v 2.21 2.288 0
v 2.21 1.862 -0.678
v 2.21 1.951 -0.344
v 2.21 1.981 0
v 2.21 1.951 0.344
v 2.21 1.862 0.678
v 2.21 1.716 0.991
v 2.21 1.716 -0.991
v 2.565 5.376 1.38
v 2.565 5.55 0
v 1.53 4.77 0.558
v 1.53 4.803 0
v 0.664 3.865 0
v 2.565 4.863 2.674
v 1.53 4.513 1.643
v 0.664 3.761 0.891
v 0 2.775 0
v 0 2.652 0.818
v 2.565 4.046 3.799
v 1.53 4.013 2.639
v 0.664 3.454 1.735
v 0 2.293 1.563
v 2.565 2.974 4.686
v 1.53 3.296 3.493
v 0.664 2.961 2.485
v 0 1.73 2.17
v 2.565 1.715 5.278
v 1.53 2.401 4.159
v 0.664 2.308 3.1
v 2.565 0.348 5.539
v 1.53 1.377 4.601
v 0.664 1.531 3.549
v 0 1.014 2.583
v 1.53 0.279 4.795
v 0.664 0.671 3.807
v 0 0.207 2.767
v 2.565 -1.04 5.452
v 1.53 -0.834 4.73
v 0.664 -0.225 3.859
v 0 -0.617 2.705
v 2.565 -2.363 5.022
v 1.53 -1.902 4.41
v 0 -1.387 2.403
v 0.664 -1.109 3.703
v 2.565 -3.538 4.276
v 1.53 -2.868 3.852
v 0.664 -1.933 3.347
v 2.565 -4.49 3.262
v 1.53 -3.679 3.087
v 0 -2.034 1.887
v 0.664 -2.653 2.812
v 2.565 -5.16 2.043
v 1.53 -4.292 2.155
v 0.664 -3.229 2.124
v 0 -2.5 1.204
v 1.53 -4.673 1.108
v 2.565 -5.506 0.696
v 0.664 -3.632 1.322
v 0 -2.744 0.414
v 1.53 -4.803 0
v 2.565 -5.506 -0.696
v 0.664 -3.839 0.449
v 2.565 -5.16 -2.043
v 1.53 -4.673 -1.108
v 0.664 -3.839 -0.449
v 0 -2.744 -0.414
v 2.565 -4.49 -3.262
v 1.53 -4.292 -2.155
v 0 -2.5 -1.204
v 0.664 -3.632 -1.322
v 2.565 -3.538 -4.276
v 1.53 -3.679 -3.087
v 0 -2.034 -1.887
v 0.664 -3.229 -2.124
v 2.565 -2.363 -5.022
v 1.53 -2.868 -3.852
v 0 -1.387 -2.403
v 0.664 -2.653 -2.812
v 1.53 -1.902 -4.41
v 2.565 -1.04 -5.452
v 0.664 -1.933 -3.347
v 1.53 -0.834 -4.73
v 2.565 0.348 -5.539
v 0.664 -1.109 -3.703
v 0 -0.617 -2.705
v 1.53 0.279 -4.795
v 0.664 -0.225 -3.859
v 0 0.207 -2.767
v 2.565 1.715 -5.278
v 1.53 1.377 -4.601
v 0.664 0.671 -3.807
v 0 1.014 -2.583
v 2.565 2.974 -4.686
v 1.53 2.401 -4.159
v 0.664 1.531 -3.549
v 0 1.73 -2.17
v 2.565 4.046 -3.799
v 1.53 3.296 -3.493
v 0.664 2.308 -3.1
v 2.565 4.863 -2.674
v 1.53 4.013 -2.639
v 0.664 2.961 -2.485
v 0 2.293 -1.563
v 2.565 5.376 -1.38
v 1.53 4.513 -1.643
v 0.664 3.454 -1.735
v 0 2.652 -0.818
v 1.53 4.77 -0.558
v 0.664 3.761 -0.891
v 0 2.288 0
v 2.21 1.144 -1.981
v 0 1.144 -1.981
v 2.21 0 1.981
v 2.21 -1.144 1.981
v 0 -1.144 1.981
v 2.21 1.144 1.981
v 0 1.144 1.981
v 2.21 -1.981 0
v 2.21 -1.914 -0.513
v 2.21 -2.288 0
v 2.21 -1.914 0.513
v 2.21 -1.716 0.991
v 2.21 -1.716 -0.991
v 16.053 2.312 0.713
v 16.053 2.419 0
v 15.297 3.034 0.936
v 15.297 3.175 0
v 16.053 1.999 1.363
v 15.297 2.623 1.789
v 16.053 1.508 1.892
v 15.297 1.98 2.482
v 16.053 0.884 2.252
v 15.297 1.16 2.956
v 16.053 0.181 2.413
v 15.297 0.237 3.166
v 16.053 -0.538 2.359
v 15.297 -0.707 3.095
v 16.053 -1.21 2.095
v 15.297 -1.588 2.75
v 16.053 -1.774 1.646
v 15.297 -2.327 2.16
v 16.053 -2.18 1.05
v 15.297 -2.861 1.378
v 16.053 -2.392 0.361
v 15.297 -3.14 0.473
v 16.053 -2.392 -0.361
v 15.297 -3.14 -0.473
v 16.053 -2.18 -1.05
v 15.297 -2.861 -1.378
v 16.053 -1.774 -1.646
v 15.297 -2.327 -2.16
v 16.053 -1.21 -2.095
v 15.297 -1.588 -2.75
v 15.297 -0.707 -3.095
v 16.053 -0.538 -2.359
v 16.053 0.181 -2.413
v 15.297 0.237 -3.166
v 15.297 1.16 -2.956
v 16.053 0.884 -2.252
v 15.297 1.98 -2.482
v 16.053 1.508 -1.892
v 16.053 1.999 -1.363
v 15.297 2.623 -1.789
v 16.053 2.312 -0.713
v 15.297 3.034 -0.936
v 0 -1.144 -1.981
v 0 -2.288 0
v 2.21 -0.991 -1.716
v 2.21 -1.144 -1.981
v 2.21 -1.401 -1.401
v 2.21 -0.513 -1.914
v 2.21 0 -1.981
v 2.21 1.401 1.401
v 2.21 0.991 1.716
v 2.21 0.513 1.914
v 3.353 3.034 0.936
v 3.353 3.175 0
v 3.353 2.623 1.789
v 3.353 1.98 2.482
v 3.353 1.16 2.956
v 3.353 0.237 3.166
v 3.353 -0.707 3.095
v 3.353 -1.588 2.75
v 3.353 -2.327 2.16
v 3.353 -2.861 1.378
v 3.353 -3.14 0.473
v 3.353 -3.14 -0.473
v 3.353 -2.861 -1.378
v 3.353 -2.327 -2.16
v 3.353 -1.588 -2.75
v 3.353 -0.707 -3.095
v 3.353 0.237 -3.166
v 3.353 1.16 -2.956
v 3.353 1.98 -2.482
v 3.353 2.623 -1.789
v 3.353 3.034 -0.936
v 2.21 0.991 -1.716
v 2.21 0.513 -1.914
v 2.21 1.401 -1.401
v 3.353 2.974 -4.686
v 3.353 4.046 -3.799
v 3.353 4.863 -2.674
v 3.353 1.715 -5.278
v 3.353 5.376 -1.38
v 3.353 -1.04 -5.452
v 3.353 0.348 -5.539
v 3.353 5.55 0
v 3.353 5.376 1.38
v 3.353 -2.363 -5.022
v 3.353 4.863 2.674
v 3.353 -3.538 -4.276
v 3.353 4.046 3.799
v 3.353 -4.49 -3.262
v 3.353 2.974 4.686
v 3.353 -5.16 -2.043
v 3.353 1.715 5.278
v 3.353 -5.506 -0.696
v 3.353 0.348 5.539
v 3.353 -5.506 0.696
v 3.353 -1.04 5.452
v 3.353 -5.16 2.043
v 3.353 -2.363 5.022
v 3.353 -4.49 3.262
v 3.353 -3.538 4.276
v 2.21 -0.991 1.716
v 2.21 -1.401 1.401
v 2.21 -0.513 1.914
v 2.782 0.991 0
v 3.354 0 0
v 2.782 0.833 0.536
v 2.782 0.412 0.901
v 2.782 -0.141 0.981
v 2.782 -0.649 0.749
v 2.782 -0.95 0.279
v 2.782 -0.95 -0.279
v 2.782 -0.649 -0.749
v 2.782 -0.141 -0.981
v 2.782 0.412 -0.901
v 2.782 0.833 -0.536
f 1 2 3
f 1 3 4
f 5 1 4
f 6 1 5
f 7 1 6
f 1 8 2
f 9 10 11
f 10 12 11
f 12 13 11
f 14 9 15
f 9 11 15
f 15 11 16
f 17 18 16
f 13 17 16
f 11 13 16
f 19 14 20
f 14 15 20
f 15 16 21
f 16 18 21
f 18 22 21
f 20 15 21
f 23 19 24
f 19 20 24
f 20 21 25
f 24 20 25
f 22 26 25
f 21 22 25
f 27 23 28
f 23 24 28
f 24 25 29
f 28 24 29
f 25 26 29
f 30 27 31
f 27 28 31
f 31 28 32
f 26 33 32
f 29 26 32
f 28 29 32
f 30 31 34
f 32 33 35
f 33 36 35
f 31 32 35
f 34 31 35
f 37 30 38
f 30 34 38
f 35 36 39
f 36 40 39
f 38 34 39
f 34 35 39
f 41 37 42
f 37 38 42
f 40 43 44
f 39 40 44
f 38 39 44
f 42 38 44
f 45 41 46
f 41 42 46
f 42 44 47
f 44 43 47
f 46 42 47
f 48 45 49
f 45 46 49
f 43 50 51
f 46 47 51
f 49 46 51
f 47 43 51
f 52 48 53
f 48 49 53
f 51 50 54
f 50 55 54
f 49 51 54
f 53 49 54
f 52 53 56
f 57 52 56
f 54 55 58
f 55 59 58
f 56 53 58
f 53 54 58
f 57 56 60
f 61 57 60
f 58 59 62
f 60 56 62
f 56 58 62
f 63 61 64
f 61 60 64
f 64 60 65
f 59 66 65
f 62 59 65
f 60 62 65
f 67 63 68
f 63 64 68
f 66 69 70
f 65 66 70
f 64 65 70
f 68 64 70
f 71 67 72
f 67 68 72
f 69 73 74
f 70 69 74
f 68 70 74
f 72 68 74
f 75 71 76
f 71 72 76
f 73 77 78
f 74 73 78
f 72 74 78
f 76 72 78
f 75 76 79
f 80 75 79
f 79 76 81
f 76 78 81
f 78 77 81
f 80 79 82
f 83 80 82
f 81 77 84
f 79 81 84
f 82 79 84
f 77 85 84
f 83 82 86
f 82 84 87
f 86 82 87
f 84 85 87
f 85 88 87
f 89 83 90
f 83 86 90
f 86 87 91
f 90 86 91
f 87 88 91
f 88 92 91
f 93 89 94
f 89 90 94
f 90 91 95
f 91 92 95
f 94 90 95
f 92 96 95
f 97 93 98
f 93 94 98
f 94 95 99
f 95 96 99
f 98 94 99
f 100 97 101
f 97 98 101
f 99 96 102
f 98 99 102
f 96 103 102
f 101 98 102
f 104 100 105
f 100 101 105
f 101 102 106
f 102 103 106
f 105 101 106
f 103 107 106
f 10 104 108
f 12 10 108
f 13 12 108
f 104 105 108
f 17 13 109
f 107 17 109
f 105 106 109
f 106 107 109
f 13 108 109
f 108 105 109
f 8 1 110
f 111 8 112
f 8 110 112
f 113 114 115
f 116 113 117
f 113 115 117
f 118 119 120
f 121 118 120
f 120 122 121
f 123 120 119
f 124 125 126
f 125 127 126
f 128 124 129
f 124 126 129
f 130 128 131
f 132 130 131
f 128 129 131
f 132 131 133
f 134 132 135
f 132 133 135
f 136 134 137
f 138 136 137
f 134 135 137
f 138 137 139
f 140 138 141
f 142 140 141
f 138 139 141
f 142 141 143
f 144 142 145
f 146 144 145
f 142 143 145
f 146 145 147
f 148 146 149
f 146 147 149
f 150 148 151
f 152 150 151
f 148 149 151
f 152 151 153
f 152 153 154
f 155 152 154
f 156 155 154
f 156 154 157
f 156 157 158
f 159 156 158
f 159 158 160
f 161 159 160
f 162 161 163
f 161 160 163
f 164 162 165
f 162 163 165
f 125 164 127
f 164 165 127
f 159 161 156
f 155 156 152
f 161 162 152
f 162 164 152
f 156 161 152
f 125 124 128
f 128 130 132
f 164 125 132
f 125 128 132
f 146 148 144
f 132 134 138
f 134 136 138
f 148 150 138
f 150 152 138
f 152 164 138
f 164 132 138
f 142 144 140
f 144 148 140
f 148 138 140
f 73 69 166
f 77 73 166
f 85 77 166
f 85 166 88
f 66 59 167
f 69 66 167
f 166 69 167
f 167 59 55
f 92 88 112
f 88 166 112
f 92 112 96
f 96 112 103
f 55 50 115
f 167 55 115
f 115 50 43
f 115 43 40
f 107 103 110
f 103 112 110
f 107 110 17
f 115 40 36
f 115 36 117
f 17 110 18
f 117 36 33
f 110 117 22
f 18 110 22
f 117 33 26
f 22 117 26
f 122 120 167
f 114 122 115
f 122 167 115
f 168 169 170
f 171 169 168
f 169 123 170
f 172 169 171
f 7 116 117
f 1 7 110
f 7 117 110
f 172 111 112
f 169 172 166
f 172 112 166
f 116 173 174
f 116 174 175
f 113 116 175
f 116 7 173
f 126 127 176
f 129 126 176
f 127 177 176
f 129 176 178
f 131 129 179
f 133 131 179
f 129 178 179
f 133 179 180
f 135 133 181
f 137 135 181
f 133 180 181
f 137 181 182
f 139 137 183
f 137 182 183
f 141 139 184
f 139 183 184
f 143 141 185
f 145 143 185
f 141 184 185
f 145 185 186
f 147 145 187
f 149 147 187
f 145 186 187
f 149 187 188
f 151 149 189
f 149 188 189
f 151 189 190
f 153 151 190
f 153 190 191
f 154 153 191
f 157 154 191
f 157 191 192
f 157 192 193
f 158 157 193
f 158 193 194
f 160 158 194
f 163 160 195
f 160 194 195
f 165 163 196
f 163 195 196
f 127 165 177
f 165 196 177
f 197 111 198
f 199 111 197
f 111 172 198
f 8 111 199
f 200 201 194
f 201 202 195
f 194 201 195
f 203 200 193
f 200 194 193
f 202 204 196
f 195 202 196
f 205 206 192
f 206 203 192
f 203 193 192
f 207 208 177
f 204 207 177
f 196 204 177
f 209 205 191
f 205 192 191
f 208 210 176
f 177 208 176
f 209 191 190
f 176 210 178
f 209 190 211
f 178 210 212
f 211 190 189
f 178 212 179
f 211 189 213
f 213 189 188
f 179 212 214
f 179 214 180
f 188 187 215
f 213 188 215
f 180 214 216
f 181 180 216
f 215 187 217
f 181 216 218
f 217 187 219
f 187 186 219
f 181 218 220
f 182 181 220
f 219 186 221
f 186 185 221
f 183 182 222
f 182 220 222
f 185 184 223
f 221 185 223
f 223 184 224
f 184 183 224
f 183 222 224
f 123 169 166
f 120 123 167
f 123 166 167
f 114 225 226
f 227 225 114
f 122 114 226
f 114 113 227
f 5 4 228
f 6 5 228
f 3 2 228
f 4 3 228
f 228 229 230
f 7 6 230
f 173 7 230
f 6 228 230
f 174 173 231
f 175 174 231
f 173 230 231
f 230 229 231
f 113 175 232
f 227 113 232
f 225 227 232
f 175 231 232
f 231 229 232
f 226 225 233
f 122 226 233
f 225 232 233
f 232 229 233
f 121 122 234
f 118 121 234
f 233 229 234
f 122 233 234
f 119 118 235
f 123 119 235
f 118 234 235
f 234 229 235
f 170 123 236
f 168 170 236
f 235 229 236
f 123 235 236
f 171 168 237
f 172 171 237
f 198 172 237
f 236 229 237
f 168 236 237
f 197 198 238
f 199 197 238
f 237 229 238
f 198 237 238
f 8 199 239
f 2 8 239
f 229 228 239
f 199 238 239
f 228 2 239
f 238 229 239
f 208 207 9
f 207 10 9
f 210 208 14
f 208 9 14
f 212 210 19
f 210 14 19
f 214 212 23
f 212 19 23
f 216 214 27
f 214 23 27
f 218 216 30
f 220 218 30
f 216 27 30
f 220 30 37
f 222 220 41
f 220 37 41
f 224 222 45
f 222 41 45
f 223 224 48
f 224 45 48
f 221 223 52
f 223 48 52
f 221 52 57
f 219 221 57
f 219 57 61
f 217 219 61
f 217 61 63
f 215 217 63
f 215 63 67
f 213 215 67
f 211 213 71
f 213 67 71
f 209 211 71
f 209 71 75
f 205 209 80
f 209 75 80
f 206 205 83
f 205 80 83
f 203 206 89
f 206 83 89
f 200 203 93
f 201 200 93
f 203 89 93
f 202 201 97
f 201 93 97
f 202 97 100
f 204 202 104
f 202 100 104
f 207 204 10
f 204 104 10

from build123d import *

# Parameters (mm, degrees)
HEX_2_DEPTH = 2.2098


with BuildPart() as part:
    # BodySke → BaseBody (revolve)
    with BuildSketch(Plane.XY):
        with BuildLine():
            Line((16.0528, 0), (16.0528, 2.41935))
            Line((16.0528, 2.41935), (15.29715, 3.175))
            Line((15.29715, 3.175), (3.3528, 3.175))
            Line((3.3528, 3.175), (3.3528, 5.5499))
            Line((3.3528, 5.5499), (2.5654, 5.5499))
            ThreePointArc((2.5654, 5.5499), (1.073764503, 4.355582759), (0, 2.77495))
            Line((0, 2.77495), (0, 0))
            Line((0, 0), (16.0528, 0))
        make_face()
    revolve(axis=Axis((0, 0, 0), (1, 0, 0)))

    # Sketch2 → PreBroach (revolve, cut)
    with BuildSketch(Plane.XY):
        Polygon((0, 1.9812), (2.2098, 1.9812), (3.353646353, 0), (0, 0), align=None)
    revolve(axis=Axis((0, 0, 0), (1, 0, 0)), mode=Mode.SUBTRACT)

    # Sketch3 → Hex 2 (cut)
    with BuildSketch(Plane(origin=(0, 0, 0), x_dir=(0, 0, -1), z_dir=(1, 0, 0))):
        Polygon((-1.9812, -1.143846353), (-1.9812, 1.143846353), (0, 2.287692707), (1.9812, 1.143846353), (1.9812, -1.143846353), (0, -2.287692707), align=None)
    extrude(amount=HEX_2_DEPTH, mode=Mode.SUBTRACT)


solid = part.part
